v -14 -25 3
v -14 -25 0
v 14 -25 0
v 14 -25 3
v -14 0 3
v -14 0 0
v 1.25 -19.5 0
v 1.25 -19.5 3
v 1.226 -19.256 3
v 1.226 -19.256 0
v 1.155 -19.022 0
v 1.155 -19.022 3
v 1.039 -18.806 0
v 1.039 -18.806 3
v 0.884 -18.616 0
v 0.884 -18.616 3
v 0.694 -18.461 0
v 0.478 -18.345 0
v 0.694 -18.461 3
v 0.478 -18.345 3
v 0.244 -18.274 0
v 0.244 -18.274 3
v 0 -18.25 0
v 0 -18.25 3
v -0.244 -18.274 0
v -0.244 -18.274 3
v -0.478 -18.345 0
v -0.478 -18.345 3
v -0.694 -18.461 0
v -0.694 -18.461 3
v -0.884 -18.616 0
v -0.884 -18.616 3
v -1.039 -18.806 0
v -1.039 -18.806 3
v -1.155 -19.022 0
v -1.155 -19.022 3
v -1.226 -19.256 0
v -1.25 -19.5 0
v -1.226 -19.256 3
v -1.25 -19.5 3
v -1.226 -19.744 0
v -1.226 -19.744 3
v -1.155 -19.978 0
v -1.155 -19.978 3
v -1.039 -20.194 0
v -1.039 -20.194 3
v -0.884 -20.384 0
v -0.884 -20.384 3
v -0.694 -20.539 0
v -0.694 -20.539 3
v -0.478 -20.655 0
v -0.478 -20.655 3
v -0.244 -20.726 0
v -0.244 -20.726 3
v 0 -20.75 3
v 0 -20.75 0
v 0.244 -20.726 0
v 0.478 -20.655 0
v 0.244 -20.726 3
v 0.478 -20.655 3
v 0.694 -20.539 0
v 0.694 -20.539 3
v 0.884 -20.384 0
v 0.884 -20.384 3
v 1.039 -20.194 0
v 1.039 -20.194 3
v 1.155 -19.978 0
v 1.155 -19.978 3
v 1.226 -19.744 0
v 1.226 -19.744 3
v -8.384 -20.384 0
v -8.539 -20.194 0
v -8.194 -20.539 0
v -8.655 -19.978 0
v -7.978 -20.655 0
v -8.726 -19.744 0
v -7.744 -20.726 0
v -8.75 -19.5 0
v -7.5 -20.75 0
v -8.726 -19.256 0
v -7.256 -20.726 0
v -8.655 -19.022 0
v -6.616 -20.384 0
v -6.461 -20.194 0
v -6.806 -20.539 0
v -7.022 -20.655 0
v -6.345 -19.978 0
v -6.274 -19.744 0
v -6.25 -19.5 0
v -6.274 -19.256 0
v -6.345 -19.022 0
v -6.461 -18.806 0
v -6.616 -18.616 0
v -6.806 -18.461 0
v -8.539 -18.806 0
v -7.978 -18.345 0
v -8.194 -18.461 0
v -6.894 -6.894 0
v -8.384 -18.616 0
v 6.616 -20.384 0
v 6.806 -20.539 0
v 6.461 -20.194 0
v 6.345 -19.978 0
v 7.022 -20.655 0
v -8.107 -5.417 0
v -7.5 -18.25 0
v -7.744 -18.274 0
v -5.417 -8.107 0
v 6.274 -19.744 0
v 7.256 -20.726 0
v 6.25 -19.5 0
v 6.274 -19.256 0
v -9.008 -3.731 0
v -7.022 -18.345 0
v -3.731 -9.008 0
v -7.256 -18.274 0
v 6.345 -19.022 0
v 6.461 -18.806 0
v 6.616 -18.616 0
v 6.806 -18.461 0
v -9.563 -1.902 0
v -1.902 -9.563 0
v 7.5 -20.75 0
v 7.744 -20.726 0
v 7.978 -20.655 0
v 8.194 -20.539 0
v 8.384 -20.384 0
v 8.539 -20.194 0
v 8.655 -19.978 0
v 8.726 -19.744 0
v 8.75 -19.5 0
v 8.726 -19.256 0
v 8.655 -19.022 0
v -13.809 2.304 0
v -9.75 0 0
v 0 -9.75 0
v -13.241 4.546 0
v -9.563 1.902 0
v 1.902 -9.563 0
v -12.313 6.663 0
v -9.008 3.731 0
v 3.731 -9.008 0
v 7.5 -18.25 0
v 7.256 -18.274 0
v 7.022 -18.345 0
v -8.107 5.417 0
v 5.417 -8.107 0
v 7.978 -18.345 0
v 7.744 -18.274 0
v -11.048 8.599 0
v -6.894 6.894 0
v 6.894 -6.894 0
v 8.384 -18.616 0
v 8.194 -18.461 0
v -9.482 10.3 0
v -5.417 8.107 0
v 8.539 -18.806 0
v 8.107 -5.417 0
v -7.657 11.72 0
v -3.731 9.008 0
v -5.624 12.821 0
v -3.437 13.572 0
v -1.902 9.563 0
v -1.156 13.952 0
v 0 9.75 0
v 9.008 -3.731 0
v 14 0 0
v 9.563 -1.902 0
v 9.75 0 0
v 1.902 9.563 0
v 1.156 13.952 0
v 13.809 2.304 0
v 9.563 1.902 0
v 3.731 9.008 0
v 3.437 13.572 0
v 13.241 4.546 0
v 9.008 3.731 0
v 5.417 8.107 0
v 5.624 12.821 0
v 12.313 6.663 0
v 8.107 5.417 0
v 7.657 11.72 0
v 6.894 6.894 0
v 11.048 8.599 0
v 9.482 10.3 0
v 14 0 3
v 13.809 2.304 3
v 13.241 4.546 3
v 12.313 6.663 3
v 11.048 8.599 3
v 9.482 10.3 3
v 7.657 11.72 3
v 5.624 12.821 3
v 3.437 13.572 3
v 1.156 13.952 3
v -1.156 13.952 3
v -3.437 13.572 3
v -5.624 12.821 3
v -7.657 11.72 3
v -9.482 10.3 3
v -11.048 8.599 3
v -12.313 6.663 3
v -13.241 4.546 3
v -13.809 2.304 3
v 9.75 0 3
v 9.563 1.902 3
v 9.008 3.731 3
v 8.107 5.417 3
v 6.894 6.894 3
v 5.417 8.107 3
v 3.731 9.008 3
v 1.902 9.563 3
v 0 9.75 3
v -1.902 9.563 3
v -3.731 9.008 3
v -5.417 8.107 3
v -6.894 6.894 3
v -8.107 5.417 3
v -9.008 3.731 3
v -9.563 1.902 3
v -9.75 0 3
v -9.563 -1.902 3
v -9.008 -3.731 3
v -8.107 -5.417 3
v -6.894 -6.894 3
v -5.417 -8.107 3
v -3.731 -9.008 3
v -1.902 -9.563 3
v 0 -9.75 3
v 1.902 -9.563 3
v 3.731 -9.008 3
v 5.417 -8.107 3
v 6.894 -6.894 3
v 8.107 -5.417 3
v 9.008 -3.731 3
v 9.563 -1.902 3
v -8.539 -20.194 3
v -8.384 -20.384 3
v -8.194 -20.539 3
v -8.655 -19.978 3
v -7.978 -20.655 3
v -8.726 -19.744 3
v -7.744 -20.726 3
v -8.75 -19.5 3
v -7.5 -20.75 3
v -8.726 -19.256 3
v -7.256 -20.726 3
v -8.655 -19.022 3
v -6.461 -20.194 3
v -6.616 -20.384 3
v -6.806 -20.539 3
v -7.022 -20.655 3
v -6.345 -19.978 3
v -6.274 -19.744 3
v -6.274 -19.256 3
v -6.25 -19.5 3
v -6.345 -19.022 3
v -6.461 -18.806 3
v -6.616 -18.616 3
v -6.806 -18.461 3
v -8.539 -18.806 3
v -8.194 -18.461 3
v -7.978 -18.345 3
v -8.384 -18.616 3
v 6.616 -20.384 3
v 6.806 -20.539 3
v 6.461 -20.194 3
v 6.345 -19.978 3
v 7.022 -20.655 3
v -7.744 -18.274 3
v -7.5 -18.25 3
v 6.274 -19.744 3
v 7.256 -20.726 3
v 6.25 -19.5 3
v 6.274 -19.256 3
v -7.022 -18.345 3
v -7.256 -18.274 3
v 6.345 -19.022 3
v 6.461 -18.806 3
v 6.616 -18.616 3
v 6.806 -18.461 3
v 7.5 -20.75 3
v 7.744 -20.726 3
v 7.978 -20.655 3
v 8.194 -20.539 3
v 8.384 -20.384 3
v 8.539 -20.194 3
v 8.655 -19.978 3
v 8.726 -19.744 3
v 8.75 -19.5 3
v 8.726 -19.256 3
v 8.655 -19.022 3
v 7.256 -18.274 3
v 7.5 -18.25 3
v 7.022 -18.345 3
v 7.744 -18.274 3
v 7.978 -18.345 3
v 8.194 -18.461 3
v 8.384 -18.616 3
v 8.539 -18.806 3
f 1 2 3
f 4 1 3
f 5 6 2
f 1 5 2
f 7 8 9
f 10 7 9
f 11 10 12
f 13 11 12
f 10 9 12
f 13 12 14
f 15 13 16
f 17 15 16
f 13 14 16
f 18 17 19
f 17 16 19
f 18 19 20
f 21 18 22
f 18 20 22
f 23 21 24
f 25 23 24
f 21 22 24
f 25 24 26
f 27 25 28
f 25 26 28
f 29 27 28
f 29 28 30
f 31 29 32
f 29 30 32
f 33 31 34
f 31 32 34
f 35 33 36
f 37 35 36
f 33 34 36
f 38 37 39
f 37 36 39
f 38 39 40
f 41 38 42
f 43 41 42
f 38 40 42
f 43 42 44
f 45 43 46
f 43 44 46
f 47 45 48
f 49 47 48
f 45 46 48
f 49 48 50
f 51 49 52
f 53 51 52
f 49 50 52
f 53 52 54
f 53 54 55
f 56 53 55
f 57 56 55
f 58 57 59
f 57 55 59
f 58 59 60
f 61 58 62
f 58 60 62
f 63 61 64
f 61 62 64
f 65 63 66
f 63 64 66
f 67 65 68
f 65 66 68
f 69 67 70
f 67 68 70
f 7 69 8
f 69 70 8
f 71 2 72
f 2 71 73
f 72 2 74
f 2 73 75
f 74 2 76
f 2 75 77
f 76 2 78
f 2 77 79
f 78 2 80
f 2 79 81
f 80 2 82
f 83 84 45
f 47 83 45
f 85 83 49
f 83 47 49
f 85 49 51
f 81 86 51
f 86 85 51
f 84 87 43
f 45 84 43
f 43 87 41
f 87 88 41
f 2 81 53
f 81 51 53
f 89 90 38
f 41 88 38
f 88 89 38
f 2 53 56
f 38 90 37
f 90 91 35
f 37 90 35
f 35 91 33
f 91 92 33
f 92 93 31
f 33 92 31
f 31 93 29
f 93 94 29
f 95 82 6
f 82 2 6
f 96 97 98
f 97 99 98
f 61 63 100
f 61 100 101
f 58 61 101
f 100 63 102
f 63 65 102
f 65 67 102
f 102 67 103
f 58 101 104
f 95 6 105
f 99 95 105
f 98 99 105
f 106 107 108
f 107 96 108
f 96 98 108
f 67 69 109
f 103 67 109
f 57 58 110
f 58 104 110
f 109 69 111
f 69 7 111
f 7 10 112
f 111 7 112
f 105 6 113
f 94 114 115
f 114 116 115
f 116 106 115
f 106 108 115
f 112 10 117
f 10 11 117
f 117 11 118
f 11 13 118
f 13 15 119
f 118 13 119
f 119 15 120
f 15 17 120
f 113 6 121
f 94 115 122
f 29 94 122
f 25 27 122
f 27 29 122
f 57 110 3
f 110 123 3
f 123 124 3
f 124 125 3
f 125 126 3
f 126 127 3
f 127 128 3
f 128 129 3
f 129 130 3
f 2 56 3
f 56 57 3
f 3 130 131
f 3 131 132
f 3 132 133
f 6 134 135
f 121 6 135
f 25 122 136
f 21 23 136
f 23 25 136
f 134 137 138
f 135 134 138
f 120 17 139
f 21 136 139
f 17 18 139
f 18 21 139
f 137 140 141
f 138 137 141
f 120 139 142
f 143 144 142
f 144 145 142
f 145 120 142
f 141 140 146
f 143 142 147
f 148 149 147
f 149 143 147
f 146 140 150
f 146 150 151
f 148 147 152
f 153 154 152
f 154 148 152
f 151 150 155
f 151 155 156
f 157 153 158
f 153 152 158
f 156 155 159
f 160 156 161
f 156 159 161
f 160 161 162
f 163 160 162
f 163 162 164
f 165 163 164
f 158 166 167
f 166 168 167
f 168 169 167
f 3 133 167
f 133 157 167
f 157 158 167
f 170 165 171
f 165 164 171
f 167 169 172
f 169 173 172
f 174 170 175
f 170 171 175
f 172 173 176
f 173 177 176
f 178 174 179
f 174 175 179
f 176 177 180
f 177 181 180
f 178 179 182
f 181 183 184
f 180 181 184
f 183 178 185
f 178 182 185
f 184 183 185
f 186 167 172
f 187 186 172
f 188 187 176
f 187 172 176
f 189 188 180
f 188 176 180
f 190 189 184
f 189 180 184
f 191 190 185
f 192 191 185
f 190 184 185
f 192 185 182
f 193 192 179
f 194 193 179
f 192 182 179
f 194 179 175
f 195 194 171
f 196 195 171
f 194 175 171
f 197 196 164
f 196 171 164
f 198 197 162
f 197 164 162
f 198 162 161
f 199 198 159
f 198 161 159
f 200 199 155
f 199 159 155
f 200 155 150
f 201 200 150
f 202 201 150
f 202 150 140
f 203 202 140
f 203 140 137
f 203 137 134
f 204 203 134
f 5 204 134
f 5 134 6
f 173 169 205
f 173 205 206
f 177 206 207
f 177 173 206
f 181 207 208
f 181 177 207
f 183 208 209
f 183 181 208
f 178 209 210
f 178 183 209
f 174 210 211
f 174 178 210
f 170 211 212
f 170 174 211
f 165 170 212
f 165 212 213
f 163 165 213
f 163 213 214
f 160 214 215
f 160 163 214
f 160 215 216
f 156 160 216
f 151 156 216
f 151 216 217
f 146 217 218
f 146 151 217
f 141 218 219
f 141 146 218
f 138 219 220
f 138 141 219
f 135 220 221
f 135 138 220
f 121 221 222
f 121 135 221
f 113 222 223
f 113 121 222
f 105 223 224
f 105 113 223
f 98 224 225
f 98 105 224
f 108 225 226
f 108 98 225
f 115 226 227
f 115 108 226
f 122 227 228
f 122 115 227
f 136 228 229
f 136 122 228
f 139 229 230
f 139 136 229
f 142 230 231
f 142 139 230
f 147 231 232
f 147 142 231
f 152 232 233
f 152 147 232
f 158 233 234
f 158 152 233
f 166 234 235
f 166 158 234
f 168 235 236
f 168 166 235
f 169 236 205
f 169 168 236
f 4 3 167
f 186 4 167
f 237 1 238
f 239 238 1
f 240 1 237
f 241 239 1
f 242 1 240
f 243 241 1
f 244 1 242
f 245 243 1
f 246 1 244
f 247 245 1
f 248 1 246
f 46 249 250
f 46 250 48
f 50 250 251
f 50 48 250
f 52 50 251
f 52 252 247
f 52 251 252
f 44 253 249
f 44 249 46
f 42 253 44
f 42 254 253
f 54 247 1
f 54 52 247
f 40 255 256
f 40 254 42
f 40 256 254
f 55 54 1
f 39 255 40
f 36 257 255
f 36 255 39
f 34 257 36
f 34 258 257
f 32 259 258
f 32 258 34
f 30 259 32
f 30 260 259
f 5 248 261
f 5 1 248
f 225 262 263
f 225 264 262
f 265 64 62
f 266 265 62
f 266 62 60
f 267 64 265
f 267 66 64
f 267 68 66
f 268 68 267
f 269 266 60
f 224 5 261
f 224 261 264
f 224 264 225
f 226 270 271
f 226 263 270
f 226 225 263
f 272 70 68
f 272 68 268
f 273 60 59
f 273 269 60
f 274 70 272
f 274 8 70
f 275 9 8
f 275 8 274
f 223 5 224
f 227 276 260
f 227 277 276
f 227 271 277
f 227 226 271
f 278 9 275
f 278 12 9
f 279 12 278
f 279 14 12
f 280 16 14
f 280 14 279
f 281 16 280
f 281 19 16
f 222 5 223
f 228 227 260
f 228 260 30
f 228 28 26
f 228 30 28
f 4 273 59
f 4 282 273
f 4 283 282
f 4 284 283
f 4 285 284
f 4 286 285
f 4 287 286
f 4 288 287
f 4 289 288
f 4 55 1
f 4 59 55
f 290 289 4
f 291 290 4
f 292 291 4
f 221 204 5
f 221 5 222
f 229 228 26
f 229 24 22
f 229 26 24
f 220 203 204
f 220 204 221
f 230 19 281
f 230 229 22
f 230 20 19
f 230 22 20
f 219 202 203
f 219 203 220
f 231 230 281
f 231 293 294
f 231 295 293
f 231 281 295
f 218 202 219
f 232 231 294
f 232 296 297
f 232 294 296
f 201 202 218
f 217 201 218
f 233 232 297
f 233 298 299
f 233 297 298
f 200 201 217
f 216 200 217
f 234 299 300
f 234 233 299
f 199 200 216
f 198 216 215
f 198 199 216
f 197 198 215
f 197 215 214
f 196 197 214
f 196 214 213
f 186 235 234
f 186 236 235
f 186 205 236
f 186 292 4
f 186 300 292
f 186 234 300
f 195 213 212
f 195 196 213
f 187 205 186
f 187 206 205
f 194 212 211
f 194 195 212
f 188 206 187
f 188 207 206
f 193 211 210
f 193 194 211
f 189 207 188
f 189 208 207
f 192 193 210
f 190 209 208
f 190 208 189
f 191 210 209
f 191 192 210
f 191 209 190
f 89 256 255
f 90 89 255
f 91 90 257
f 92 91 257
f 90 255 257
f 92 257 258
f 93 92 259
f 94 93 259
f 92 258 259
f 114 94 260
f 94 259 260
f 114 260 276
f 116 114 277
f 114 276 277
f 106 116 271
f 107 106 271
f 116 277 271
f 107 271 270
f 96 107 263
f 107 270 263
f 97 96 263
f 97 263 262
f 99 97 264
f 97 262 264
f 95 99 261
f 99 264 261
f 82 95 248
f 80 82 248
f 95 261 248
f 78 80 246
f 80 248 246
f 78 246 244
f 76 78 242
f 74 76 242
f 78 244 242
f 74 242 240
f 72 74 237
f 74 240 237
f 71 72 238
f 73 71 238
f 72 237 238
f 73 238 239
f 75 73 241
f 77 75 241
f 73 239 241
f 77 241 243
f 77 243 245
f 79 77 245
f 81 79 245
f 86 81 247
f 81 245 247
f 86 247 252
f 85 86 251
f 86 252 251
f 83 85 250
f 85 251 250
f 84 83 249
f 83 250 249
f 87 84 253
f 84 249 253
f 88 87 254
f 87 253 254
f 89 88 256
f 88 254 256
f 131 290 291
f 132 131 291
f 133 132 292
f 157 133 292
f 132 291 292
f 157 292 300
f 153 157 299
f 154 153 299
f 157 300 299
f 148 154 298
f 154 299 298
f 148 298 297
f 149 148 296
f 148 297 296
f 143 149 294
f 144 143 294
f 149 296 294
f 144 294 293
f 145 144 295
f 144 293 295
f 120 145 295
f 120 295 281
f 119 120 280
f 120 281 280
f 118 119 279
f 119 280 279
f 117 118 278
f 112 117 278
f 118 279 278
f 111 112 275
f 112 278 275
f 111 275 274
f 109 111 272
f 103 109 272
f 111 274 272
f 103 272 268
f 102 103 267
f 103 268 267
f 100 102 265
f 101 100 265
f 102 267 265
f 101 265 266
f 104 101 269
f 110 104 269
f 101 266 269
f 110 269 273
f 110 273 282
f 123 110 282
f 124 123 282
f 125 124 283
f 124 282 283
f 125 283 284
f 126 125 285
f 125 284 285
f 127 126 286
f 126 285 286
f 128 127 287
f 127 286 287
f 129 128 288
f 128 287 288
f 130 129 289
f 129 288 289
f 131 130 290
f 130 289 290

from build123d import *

# Parameters (mm, degrees)
CROQUIS1_R              = 9.75
SALIENTE_EXTRUIR1_DEPTH = 3
CROQUIS2_R              = 1.25
CORTAR_EXTRUIR1_DEPTH   = 3


with BuildPart() as part:
    # Croquis1 → Saliente-Extruir1 (new body)
    with BuildSketch(Plane.XY):
        with BuildLine():
            Line((-14, -25), (14, -25))
            Line((14, -25), (14, 0))
            ThreePointArc((14, 0), (0, 14), (-14, 0))
            Line((-14, 0), (-14, -25))
        make_face()
        Circle(CROQUIS1_R, mode=Mode.SUBTRACT)
    extrude(amount=SALIENTE_EXTRUIR1_DEPTH)

    # Croquis2 → Cortar-Extruir1 (cut)
    with BuildSketch(Plane.XY.offset(3)):
        with Locations((0, -19.5)):
            Circle(CROQUIS2_R)
        with Locations((7.5, -19.5)):
            Circle(CROQUIS2_R)
        with Locations((-7.5, -19.5)):
            Circle(CROQUIS2_R)
    extrude(amount=-CORTAR_EXTRUIR1_DEPTH, mode=Mode.SUBTRACT)


solid = part.part
